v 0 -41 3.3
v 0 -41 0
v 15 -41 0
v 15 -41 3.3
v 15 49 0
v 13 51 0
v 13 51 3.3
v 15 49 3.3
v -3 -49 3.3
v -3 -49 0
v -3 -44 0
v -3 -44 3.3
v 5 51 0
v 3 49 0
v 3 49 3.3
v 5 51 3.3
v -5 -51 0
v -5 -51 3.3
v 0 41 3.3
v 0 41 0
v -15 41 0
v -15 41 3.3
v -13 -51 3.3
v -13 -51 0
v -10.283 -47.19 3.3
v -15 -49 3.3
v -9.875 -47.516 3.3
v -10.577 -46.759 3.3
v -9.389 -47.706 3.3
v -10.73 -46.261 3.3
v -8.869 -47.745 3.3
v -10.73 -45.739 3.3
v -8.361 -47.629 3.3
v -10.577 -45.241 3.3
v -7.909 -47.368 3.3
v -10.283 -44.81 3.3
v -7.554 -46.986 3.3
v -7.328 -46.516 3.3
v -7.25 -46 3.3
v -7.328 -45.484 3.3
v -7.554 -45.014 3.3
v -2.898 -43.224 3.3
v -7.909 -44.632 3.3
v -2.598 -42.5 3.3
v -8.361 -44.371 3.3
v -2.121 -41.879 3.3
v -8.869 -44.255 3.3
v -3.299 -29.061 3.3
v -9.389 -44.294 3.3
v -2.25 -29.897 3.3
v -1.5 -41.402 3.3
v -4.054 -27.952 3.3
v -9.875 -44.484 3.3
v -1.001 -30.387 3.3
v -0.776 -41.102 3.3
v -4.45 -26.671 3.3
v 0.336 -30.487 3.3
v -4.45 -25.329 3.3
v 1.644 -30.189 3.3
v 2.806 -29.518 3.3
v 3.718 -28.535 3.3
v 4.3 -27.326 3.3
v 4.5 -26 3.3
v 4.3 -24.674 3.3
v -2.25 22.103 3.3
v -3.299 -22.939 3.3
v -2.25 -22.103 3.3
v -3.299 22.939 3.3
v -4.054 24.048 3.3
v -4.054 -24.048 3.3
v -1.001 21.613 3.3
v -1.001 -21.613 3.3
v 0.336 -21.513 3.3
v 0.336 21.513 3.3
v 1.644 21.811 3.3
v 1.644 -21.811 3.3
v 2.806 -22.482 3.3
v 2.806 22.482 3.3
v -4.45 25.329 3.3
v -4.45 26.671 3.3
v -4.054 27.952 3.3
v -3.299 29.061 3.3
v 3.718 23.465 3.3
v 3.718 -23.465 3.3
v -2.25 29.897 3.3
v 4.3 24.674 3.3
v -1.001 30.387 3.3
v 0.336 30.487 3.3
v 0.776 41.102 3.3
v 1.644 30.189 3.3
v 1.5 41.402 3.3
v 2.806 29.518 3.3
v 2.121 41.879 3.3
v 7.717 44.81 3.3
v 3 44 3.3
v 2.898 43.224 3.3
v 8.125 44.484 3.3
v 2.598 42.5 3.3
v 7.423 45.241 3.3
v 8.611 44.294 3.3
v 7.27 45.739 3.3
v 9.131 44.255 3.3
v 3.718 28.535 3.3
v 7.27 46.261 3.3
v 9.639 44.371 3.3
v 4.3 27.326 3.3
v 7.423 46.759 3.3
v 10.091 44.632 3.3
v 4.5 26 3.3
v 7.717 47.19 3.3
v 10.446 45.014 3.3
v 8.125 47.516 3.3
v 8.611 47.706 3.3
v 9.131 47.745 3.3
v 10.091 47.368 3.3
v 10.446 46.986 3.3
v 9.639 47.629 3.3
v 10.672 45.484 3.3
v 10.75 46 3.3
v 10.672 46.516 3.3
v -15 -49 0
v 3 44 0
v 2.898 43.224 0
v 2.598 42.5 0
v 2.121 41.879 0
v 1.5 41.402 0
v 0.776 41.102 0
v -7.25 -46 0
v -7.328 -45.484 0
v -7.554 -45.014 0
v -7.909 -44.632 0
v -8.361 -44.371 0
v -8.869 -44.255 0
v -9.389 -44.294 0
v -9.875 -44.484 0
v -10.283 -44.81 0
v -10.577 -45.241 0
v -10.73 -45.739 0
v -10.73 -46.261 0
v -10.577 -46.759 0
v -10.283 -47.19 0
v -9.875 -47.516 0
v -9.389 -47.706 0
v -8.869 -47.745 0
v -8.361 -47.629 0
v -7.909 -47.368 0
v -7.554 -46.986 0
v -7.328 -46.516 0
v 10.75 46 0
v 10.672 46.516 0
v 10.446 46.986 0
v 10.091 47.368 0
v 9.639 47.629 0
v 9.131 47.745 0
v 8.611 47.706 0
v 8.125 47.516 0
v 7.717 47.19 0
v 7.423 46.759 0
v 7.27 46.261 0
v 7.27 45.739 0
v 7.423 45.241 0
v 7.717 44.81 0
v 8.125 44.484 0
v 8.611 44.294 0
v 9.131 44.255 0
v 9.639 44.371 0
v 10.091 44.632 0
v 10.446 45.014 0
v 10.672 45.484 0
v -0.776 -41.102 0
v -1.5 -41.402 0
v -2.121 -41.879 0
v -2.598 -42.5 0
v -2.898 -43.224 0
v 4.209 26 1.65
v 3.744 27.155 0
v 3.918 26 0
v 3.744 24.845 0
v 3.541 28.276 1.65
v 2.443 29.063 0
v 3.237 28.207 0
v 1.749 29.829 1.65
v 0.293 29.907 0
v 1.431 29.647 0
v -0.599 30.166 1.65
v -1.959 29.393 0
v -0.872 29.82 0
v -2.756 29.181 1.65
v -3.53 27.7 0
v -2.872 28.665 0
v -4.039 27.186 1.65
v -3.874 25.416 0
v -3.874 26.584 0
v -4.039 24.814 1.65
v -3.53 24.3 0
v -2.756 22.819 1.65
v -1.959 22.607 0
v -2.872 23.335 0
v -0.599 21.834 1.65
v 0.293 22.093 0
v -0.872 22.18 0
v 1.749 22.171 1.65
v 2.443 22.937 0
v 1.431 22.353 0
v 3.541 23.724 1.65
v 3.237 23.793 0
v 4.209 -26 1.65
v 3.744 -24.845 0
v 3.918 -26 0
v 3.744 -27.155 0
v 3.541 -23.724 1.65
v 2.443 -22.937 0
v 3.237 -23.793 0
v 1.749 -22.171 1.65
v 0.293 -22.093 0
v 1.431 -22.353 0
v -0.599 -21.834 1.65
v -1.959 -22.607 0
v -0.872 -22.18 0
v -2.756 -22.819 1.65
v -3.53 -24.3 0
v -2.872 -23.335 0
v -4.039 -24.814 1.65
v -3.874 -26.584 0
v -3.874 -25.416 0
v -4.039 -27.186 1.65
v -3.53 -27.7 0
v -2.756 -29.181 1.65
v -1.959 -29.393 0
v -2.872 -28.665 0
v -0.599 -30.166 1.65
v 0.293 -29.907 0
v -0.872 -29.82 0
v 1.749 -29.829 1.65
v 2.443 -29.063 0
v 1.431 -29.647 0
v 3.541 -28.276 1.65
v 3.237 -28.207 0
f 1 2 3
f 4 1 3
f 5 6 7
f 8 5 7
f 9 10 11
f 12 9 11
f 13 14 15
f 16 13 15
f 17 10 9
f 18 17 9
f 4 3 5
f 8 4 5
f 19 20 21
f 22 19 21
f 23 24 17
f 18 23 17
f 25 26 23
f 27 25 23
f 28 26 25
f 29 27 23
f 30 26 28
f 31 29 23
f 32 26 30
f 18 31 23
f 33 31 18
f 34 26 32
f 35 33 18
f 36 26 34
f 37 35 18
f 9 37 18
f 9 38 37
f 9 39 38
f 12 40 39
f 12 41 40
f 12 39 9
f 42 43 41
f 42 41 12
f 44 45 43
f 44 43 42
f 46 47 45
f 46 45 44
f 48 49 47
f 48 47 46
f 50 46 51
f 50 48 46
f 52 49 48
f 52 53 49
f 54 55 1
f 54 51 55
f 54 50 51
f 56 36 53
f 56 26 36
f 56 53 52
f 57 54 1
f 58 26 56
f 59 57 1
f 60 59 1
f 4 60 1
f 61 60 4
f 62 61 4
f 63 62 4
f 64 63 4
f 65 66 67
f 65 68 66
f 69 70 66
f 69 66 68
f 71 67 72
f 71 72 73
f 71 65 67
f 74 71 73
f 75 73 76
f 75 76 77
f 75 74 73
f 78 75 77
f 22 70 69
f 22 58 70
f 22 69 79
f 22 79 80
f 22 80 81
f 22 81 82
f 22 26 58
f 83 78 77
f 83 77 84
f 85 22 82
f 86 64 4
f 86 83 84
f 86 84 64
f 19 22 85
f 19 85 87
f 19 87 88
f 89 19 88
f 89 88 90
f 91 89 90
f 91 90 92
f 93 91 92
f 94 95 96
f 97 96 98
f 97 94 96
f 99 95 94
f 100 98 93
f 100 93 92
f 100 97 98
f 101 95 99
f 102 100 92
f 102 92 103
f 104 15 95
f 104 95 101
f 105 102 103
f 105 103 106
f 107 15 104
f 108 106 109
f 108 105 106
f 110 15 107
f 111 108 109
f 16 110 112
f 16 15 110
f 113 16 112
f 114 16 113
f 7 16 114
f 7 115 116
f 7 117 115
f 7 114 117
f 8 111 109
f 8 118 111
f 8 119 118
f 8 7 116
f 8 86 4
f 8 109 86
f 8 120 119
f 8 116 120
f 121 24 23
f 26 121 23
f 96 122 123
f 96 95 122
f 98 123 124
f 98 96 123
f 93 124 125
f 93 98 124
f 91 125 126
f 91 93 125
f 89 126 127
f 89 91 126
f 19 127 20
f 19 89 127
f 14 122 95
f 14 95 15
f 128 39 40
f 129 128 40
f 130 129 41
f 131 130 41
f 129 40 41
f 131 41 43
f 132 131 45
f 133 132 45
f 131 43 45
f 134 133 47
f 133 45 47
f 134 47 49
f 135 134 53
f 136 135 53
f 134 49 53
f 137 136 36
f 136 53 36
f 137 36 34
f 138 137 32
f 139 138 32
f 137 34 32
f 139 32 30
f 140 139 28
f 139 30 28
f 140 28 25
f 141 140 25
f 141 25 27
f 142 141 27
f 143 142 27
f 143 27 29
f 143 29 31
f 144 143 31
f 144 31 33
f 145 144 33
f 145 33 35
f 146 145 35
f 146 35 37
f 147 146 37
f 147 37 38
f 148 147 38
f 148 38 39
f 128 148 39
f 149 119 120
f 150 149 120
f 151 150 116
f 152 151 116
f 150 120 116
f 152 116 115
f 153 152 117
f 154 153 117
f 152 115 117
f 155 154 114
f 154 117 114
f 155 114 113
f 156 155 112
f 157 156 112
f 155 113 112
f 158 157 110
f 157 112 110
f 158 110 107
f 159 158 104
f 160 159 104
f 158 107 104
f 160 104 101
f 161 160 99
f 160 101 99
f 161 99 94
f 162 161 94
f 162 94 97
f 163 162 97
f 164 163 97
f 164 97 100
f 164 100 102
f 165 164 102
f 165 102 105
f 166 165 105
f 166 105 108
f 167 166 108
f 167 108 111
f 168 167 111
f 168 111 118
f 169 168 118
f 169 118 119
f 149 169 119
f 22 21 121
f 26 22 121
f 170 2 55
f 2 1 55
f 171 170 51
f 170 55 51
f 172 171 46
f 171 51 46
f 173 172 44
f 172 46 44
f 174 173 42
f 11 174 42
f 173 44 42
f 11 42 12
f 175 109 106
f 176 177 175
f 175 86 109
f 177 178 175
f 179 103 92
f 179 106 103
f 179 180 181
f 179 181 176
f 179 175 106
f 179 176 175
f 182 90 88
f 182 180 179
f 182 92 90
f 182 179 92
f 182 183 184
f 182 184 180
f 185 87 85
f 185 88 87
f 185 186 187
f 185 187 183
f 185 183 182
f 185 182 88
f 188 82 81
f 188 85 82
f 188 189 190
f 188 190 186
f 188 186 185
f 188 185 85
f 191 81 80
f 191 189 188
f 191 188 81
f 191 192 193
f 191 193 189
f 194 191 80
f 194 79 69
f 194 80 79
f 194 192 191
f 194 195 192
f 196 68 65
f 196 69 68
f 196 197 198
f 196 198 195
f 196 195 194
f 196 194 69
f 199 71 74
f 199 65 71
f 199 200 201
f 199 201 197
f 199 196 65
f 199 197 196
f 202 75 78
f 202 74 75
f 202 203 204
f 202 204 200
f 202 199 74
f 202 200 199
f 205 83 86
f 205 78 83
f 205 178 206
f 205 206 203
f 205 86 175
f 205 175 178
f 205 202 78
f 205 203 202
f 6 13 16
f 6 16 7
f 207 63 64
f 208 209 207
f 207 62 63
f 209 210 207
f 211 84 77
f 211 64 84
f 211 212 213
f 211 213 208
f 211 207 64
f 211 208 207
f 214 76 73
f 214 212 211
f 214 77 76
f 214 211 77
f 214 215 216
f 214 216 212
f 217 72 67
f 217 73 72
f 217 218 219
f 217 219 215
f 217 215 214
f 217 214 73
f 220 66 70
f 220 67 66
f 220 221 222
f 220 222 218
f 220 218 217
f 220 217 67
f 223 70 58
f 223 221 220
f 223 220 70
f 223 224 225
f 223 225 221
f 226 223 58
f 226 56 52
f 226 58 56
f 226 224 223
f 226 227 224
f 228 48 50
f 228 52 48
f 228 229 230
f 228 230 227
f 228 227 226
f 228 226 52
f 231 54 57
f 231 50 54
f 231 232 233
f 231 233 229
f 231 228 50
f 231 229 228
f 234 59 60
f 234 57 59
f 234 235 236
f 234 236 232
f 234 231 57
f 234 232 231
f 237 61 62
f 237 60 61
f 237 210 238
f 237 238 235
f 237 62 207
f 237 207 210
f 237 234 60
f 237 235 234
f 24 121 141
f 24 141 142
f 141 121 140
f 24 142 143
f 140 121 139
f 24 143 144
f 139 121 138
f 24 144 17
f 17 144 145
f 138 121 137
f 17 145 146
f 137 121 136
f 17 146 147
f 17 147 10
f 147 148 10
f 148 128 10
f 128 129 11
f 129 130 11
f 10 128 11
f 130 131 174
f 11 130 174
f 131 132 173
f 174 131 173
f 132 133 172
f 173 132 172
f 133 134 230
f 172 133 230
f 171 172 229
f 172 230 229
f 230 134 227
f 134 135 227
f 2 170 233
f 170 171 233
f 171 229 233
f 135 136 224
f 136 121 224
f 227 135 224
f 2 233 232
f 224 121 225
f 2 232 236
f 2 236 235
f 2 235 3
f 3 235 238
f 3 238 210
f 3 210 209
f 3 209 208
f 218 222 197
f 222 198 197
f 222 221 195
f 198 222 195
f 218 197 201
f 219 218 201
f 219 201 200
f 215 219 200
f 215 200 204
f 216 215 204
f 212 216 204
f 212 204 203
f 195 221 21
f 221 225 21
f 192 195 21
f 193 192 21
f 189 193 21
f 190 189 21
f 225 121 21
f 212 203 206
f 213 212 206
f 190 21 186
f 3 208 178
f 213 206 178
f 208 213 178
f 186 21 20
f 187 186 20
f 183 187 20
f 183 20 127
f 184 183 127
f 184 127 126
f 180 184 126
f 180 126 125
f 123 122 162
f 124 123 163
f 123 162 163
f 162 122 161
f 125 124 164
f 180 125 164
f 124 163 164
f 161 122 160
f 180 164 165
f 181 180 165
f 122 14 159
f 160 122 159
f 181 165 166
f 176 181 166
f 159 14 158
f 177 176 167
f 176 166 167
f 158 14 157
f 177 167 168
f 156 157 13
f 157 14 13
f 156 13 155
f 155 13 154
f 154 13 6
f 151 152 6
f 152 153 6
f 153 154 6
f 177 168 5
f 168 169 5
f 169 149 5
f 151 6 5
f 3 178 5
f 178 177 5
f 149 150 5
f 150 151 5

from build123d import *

# Parameters (mm, degrees)
F0_W      = 12
F0_H      = 10
F1_DEPTH  = 3.3
F2_SIZE   = 2
F3_R      = 3
F4_R      = 3
F5_R      = 1.75
F6_DEPTH  = 25
F7_R      = 2.5
F8_DEPTH  = 25
F9_R      = 4.5
F10_DEPTH = 25
F10_TAPER = 10


with BuildPart() as f1:
    # F0 (on Top) → F1 (new body)
    with BuildSketch(Plane.XY):
        Polygon((15, -41), (15, 41), (3, 41), (-15, 41), (-15, -41), (-3, -41), align=None)
        with Locations((9, 46)):
            Rectangle(F0_W, F0_H)
        with Locations((-9, -46)):
            Rectangle(F0_W, F0_H)
    extrude(amount=F1_DEPTH)

    # F2
    f2_edges = [f1.edges().sort_by_distance(p)[0] for p in [
        (15, 51, 1.65),
        (3, 51, 1.65),
        (-15, -51, 1.65),
        (-3, -51, 1.65),
    ]]
    chamfer(f2_edges, length=F2_SIZE)

    # F3
    f3_edges = [f1.edges().sort_by_distance(p)[0] for p in [
        (3, 41, 1.65),
    ]]
    fillet(f3_edges, radius=F3_R)

    # F4
    f4_edges = [f1.edges().sort_by_distance(p)[0] for p in [
        (-3, -41, 1.65),
    ]]
    fillet(f4_edges, radius=F4_R)

    # F5 (on face) → F6 (cut)
    with BuildSketch(Plane.XY.offset(3.3)):
        with Locations((9, 46)):
            Circle(F5_R)
        with Locations((-9, -46)):
            Circle(F5_R)
    extrude(amount=-F6_DEPTH, mode=Mode.SUBTRACT)

    # F7 (on face) → F8 (cut)
    with BuildSketch(Plane.XY.offset(3.3)):
        with Locations((0, 26)):
            Circle(F7_R)
        with Locations((0, -26)):
            Circle(F7_R)
    extrude(amount=-F8_DEPTH, mode=Mode.SUBTRACT)

    # F9 (on face) → F10 (cut)
    with BuildSketch(Plane.XY.offset(3.3)):
        with Locations((0, 26)):
            Circle(F9_R)
        with Locations((0, -26)):
            Circle(F9_R)
    extrude(amount=-F10_DEPTH, taper=F10_TAPER, mode=Mode.SUBTRACT)


solid = f1.part
